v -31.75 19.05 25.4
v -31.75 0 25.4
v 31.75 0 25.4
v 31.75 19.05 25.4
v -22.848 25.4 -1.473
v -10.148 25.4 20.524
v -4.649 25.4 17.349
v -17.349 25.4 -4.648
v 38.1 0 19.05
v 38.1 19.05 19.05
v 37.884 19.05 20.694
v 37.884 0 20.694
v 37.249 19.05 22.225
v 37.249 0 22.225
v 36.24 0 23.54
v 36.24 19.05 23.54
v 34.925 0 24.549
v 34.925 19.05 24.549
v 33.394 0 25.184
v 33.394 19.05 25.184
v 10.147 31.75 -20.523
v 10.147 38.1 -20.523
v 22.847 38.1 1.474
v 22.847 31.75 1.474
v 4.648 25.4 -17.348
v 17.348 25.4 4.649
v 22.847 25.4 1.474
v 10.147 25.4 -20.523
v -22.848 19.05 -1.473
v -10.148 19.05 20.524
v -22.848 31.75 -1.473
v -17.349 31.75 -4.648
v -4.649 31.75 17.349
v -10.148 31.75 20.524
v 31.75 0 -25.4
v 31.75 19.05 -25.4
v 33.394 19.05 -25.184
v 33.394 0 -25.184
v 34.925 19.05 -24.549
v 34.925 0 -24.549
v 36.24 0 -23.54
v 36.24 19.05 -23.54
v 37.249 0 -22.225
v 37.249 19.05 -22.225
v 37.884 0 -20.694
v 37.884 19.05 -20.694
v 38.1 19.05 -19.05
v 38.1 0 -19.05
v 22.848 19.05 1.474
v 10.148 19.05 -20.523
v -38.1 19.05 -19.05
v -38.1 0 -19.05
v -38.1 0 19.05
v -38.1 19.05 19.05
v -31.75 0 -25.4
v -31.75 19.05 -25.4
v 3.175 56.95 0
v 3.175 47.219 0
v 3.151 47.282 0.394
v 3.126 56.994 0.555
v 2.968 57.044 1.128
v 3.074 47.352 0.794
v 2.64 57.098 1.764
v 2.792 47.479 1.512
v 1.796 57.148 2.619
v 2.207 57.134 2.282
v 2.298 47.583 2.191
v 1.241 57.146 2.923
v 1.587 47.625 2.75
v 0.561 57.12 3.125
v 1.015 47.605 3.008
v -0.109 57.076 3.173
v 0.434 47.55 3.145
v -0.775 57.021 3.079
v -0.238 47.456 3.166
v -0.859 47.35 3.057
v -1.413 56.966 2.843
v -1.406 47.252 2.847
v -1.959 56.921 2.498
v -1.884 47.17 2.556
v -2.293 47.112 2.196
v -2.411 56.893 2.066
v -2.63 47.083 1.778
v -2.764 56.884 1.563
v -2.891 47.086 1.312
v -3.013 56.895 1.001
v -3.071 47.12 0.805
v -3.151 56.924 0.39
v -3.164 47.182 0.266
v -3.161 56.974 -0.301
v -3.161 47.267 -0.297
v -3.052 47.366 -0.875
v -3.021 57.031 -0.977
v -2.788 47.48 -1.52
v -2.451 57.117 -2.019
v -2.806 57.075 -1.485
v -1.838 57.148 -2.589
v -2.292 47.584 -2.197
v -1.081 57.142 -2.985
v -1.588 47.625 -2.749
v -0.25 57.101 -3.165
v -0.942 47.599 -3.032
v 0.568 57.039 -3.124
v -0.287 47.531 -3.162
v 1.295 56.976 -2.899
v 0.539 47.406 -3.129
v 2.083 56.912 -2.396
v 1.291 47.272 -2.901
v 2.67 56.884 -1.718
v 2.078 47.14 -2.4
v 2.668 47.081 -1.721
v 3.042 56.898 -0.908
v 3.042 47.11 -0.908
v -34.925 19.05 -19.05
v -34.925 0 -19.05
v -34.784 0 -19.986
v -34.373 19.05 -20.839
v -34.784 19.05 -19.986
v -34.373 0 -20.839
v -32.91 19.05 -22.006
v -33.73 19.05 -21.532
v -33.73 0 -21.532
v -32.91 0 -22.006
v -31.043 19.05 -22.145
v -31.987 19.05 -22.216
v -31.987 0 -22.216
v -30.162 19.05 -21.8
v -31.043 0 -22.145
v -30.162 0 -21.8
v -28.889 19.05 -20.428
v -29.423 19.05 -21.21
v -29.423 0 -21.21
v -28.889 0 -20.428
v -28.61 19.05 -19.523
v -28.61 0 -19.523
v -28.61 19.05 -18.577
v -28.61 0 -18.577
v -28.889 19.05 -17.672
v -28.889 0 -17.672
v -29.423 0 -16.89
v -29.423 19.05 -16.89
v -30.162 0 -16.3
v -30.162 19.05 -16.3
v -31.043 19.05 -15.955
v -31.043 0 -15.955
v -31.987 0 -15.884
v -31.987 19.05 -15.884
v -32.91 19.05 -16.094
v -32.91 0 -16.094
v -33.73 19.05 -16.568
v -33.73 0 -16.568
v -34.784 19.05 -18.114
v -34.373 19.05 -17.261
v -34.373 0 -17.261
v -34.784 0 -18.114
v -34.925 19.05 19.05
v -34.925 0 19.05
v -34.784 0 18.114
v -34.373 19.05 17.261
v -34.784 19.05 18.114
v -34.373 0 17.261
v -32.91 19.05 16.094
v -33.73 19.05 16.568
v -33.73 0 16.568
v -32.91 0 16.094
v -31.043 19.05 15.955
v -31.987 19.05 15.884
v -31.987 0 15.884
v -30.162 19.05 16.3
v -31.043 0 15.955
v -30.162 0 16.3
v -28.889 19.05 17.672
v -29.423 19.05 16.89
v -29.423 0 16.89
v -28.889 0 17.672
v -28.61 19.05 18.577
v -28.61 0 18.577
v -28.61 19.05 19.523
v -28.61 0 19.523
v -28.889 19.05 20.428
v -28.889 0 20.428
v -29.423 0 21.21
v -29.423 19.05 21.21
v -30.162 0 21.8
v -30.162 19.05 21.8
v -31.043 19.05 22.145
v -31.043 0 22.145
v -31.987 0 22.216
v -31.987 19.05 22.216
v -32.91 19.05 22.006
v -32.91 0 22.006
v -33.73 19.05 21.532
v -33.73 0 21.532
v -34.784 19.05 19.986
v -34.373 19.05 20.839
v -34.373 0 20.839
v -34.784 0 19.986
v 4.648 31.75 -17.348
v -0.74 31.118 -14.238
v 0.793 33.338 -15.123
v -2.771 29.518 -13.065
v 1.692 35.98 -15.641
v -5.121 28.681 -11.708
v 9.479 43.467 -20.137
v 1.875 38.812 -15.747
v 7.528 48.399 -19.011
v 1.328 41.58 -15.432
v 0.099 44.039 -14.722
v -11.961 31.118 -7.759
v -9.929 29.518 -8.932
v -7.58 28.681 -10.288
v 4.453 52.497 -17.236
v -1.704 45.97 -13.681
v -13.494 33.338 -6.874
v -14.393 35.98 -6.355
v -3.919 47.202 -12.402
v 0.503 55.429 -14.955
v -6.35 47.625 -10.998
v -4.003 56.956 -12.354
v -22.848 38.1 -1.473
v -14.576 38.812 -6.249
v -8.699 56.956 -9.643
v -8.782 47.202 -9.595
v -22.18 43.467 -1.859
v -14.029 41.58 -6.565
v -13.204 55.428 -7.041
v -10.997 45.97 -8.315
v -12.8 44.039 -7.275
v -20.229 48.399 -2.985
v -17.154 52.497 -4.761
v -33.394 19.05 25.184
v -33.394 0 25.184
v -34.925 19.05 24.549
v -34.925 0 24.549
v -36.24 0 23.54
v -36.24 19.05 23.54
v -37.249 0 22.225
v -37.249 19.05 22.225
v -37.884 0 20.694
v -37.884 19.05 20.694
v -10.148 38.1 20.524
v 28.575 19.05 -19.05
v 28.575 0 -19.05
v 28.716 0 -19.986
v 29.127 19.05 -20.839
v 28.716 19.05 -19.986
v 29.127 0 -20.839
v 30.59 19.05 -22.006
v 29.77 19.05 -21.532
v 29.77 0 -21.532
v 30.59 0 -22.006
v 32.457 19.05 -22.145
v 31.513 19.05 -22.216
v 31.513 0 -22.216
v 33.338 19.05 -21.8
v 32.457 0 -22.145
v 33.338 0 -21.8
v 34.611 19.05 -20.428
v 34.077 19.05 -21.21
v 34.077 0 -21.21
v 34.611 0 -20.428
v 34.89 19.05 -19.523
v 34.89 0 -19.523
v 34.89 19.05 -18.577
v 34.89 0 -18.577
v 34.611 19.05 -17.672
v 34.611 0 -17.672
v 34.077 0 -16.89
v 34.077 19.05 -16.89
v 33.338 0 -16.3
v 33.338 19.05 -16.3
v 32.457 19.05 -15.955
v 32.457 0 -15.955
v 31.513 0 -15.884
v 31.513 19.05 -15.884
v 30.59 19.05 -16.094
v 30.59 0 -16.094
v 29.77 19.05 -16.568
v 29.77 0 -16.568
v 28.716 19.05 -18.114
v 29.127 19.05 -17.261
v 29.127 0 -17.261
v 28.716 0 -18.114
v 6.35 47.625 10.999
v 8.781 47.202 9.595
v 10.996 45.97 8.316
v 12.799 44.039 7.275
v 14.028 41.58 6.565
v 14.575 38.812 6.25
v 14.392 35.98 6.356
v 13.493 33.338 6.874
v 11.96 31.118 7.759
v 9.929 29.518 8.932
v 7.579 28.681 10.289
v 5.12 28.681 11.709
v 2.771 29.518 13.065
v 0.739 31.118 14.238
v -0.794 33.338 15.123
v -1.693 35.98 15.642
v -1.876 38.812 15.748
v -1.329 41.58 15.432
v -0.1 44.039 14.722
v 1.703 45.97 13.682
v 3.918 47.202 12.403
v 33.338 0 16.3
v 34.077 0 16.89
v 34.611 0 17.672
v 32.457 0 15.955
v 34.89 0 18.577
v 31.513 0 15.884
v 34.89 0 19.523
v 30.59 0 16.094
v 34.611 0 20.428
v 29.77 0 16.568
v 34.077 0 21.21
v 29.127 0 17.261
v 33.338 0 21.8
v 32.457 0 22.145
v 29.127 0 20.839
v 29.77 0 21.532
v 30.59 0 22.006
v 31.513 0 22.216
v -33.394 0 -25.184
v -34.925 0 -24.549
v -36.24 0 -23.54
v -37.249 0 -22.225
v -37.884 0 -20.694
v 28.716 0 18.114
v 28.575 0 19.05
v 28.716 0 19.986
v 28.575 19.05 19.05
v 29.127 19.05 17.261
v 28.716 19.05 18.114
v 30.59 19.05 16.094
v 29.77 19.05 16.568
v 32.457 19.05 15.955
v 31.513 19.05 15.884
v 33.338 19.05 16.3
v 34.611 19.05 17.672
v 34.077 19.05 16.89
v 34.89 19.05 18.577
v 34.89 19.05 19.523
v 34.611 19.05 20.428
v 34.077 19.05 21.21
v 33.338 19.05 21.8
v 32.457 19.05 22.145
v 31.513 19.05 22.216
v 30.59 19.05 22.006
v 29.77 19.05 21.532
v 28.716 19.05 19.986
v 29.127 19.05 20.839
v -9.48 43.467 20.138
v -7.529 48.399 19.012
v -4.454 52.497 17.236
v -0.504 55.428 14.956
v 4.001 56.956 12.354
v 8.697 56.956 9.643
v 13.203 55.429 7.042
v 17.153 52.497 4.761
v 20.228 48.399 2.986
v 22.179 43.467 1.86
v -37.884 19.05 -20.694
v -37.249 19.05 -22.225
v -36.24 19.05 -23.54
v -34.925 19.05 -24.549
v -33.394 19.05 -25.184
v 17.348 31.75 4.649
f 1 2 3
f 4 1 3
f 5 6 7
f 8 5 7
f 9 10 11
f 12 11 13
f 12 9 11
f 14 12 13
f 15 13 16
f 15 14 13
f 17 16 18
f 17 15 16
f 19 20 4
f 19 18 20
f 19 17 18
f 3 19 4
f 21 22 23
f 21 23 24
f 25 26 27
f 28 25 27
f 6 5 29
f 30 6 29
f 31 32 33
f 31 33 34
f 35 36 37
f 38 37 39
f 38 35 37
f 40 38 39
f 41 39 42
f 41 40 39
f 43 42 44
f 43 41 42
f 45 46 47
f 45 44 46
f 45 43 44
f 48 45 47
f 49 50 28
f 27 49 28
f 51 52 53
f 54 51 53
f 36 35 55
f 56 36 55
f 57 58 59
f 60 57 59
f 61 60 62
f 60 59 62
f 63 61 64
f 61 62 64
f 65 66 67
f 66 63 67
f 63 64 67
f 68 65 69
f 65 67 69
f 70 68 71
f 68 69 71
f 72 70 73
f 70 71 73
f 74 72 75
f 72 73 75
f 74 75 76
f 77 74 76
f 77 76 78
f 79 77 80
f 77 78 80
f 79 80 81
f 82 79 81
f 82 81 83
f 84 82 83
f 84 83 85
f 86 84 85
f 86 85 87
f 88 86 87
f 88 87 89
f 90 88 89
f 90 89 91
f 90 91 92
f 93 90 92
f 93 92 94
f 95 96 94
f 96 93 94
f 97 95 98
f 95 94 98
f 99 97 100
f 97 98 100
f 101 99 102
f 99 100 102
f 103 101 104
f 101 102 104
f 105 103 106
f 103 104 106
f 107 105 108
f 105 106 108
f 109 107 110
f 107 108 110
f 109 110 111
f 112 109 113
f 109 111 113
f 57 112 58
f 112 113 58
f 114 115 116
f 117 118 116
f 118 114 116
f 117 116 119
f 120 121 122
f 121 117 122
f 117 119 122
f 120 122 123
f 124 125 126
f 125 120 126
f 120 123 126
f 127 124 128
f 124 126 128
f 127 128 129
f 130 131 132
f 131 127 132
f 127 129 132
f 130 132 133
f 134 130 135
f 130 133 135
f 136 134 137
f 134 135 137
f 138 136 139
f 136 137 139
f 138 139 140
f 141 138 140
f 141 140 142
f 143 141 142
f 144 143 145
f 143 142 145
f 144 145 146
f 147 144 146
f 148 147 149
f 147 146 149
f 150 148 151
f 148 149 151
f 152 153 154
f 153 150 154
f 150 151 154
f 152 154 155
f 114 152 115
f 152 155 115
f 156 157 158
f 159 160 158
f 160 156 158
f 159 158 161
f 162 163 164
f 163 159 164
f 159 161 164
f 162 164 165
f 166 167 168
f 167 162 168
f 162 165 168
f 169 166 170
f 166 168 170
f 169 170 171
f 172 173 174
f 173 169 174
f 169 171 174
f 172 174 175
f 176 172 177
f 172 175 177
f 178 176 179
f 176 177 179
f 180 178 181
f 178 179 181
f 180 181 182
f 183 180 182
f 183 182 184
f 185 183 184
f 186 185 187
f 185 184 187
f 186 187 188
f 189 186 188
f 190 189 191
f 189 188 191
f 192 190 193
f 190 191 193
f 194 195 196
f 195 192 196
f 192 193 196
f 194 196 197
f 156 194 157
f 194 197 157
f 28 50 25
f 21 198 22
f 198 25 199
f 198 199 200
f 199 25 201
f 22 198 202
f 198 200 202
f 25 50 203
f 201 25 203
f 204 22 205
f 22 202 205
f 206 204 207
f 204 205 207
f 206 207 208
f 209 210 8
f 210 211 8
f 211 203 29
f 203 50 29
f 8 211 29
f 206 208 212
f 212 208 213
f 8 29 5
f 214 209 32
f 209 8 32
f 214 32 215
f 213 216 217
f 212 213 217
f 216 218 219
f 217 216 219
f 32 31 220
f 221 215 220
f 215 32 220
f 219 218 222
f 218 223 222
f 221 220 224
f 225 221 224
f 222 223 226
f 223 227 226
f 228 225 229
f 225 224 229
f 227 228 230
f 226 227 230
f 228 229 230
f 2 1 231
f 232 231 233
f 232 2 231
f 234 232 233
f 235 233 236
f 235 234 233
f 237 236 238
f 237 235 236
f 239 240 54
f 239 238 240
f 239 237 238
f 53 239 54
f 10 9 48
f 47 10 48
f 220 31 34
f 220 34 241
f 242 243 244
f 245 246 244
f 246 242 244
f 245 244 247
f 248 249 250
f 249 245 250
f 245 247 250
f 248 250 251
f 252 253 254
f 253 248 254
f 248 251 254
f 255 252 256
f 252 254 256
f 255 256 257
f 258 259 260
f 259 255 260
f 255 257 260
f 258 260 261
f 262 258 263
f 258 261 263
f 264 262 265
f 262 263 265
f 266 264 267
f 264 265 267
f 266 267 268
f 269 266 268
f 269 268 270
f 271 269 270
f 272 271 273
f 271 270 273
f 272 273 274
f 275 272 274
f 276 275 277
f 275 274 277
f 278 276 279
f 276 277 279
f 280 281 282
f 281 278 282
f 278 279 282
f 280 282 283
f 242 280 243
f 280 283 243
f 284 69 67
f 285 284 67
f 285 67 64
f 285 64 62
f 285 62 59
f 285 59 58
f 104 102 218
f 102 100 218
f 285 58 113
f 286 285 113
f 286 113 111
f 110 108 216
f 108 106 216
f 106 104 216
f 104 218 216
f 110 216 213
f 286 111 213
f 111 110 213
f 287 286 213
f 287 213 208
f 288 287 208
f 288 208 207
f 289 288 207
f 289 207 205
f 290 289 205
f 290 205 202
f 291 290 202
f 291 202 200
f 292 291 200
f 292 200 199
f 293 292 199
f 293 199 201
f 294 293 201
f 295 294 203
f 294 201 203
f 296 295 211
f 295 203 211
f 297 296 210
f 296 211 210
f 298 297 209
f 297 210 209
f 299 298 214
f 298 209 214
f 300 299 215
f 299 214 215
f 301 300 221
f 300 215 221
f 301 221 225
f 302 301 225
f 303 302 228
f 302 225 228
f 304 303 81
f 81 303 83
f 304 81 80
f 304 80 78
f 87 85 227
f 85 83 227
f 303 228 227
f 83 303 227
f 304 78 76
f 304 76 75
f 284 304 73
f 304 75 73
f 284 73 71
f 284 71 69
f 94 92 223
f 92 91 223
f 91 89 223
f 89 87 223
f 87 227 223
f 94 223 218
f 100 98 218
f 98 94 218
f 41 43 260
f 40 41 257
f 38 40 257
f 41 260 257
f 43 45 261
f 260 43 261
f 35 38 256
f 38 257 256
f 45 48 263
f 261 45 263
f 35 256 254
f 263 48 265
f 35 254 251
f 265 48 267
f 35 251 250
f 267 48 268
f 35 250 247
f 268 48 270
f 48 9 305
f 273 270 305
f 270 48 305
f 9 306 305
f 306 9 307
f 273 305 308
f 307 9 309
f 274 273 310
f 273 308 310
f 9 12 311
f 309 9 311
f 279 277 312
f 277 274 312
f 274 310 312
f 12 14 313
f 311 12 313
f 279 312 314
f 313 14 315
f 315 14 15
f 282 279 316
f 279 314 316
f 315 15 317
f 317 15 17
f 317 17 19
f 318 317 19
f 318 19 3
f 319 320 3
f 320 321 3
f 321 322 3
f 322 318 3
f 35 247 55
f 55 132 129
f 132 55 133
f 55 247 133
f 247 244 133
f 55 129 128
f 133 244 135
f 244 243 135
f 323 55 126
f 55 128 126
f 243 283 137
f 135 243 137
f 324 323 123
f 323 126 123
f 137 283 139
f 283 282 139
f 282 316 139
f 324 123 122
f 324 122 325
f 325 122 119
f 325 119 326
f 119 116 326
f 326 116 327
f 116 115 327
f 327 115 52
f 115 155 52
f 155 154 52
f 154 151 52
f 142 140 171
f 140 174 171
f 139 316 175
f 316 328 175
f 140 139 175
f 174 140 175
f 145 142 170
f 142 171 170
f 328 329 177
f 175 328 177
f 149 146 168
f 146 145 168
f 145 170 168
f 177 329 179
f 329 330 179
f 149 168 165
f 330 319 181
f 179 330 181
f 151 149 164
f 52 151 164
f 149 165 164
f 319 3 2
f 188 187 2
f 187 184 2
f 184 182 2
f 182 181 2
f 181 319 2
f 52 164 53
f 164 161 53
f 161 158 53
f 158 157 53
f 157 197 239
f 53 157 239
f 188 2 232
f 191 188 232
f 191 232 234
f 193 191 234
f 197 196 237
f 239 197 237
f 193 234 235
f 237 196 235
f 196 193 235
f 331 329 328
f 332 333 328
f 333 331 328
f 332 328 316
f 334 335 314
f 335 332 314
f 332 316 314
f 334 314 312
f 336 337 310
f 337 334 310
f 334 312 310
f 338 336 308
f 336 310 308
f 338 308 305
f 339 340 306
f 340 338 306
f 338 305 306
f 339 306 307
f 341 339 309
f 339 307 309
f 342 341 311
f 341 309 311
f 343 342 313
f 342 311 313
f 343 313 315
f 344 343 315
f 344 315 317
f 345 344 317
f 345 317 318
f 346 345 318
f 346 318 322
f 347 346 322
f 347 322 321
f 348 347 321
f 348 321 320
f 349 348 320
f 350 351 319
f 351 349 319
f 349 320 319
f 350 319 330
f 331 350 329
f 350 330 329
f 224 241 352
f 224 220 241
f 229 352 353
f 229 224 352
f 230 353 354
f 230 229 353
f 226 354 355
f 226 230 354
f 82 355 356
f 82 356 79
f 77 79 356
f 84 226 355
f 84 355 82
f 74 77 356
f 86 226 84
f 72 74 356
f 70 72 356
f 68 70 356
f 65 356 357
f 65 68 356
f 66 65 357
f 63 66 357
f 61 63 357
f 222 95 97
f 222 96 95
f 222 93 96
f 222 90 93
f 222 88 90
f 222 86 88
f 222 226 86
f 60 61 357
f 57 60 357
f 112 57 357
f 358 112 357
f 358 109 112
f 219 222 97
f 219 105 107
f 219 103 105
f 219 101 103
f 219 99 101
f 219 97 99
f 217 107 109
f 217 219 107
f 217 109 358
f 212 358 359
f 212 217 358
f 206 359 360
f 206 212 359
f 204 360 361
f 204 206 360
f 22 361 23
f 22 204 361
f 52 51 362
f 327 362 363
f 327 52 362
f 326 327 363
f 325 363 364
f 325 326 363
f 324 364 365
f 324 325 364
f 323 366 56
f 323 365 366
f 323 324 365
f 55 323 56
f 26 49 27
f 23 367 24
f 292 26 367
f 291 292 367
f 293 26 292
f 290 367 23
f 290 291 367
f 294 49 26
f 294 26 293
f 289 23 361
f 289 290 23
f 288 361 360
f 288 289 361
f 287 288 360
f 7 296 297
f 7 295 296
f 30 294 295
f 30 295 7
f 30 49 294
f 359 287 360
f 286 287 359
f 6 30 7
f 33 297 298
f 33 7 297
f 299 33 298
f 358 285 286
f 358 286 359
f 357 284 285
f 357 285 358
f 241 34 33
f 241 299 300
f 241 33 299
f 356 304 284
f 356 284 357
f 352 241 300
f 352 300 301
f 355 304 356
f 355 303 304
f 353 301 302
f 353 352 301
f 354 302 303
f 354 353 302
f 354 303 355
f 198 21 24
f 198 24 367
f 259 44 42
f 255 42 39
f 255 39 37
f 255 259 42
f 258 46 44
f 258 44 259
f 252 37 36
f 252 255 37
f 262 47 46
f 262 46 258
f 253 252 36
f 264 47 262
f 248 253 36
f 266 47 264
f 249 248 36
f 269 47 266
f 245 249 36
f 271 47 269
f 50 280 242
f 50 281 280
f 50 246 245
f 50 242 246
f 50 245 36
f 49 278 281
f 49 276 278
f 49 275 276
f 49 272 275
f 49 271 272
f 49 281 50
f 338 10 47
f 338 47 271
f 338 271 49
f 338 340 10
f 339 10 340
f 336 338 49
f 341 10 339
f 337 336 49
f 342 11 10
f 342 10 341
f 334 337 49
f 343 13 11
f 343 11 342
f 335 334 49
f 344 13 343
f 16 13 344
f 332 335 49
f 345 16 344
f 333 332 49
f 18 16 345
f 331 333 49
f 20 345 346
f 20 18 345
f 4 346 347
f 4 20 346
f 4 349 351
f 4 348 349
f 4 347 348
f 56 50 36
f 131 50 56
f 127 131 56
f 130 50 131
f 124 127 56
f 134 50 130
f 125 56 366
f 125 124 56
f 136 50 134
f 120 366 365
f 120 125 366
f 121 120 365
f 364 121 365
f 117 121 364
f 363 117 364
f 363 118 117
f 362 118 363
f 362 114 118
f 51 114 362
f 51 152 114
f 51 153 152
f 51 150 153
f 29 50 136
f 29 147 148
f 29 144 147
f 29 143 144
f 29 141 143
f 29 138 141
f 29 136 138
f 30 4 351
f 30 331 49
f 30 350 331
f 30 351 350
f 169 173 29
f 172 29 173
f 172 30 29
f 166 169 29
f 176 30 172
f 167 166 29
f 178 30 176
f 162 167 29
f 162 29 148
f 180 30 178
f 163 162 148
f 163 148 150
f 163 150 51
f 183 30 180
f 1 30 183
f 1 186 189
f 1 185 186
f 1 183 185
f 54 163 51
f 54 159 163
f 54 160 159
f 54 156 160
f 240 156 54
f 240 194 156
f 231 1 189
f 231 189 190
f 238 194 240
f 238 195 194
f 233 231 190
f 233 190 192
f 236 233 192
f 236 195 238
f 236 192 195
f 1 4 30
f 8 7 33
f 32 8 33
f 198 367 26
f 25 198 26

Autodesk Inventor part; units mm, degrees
sketch "Sketch1" plane through (0, 0, 0) normal (0, 1, 0) x (-1, 0, 0)
  line L0 (31.75, 25.4) -> (-31.75, 25.4)
  line L1 (-38.1, 19.05) -> (-38.1, -19.05)
  line L2 (-31.75, -25.4) -> (31.75, -25.4)
  line L3 (38.1, -19.05) -> (38.1, 19.05)
  arc A0 (31.75, -25.4) -> (38.1, -19.05) centre (31.75, -19.05) ccw
  arc A1 (38.1, 19.05) -> (31.75, 25.4) centre (31.75, 19.05) ccw
  arc A2 (-31.75, 25.4) -> (-38.1, 19.05) centre (-31.75, 19.05) ccw
  arc A3 (-38.1, -19.05) -> (-31.75, -25.4) centre (-31.75, -19.05) ccw
  circle A4 centre (31.75, -19.05) radius 3.175
  circle A5 centre (31.75, 19.05) radius 3.175
  circle A6 centre (-31.75, 19.05) radius 3.175
  circle A7 centre (-31.75, -19.05) radius 3.175
  point P0 (0, 0)
  dimension "d0" = 6.35
  dimension "d1" = 50.8
  dimension "d2" = 76.2
  dimension "d3" = 38.1
  dimension "d4" = 25.4
  dimension "d5" = 6.35
  dimension "d6" = 6.35
  dimension "d7" = 6.35
  dimension "d8" = 6.35
extrude "Extrusion1" add sketch "Sketch1" along normal blind 19.05
ref_plane "Work Plane1" through (0, 0, 0) normal (0.5, 0, 0.866) x (0, 1, 0)
sketch "Sketch2" plane through (0, 0, 0) normal (0.5, 0, 0.866) x (0, 1, 0)
  line L0 (19.05, -40.1963) -> (19.05, 14.7963) projected
  line L1 (0, 14.7963) -> (19.05, 14.7963) projected
  line L2 (25.3995, 19.0504) -> (25.3995, 12.7004)
  line L3 (25.3995, 12.7004) -> (31.7495, 12.7005)
  line L4 (31.7495, 12.7005) -> (31.7495, 19.0505)
  line L5 (31.7495, 19.0505) -> (38.0995, 19.0505)
  line L6 (38.1, -19.0495) -> (31.75, -19.0495)
  line L7 (31.75, -19.0495) -> (31.7499, -12.6995)
  line L8 (31.7499, -12.6995) -> (25.3999, -12.6996)
  line L9 (25.3999, -12.6996) -> (25.4, -19.0496)
  line L10 (19.05, -19.0497) -> (25.4, -19.0496)
  arc A0 (38.1, -19.0495) -> (38.0995, 19.0505) centre (38.1, 0.0005) ccw
  circle A1 centre (38.1, 0.0005) radius 9.525
  line L11 (25.3995, 19.0504) -> (19.05, 19.0504)
  line L12 (19.05, 19.0504) -> (19.05, -19.0497)
  point P0 (0, 0)
  dimension "d19" = 38.1
  dimension "d20" = 19.05
  dimension "d21" = 6.35
  dimension "d22" = 6.35
  dimension "d23" = 6.35
  dimension "d25" = 6.35
  dimension "d28" = 19.05
  dimension "d29" = 19.05
  dimension "d30" = 6.35
  dimension "d31" = 6.3495
  dimension "d32" = 38.1001
extrude "Extrusion2" add sketch "Sketch2" along normal mid plane 25.4
ref_plane "Work Plane2" through (0, 38.1, 0) normal (0, 1, 0) x (1, 0, 0)
sketch "Sketch3" plane through (0, 38.1, 0) normal (0, 1, 0) x (1, 0, 0)
  circle A0 centre (0, 0) radius 3.175
  dimension "d36" = 6.35
extrude "Extrusion3" cut sketch "Sketch3" along normal blind 25.4
equation "\"d6\" = d5"
equation "\"d7\" = d5"
equation "\"d8\" = d5"
properties part number "Chpt9_Tutorial"
